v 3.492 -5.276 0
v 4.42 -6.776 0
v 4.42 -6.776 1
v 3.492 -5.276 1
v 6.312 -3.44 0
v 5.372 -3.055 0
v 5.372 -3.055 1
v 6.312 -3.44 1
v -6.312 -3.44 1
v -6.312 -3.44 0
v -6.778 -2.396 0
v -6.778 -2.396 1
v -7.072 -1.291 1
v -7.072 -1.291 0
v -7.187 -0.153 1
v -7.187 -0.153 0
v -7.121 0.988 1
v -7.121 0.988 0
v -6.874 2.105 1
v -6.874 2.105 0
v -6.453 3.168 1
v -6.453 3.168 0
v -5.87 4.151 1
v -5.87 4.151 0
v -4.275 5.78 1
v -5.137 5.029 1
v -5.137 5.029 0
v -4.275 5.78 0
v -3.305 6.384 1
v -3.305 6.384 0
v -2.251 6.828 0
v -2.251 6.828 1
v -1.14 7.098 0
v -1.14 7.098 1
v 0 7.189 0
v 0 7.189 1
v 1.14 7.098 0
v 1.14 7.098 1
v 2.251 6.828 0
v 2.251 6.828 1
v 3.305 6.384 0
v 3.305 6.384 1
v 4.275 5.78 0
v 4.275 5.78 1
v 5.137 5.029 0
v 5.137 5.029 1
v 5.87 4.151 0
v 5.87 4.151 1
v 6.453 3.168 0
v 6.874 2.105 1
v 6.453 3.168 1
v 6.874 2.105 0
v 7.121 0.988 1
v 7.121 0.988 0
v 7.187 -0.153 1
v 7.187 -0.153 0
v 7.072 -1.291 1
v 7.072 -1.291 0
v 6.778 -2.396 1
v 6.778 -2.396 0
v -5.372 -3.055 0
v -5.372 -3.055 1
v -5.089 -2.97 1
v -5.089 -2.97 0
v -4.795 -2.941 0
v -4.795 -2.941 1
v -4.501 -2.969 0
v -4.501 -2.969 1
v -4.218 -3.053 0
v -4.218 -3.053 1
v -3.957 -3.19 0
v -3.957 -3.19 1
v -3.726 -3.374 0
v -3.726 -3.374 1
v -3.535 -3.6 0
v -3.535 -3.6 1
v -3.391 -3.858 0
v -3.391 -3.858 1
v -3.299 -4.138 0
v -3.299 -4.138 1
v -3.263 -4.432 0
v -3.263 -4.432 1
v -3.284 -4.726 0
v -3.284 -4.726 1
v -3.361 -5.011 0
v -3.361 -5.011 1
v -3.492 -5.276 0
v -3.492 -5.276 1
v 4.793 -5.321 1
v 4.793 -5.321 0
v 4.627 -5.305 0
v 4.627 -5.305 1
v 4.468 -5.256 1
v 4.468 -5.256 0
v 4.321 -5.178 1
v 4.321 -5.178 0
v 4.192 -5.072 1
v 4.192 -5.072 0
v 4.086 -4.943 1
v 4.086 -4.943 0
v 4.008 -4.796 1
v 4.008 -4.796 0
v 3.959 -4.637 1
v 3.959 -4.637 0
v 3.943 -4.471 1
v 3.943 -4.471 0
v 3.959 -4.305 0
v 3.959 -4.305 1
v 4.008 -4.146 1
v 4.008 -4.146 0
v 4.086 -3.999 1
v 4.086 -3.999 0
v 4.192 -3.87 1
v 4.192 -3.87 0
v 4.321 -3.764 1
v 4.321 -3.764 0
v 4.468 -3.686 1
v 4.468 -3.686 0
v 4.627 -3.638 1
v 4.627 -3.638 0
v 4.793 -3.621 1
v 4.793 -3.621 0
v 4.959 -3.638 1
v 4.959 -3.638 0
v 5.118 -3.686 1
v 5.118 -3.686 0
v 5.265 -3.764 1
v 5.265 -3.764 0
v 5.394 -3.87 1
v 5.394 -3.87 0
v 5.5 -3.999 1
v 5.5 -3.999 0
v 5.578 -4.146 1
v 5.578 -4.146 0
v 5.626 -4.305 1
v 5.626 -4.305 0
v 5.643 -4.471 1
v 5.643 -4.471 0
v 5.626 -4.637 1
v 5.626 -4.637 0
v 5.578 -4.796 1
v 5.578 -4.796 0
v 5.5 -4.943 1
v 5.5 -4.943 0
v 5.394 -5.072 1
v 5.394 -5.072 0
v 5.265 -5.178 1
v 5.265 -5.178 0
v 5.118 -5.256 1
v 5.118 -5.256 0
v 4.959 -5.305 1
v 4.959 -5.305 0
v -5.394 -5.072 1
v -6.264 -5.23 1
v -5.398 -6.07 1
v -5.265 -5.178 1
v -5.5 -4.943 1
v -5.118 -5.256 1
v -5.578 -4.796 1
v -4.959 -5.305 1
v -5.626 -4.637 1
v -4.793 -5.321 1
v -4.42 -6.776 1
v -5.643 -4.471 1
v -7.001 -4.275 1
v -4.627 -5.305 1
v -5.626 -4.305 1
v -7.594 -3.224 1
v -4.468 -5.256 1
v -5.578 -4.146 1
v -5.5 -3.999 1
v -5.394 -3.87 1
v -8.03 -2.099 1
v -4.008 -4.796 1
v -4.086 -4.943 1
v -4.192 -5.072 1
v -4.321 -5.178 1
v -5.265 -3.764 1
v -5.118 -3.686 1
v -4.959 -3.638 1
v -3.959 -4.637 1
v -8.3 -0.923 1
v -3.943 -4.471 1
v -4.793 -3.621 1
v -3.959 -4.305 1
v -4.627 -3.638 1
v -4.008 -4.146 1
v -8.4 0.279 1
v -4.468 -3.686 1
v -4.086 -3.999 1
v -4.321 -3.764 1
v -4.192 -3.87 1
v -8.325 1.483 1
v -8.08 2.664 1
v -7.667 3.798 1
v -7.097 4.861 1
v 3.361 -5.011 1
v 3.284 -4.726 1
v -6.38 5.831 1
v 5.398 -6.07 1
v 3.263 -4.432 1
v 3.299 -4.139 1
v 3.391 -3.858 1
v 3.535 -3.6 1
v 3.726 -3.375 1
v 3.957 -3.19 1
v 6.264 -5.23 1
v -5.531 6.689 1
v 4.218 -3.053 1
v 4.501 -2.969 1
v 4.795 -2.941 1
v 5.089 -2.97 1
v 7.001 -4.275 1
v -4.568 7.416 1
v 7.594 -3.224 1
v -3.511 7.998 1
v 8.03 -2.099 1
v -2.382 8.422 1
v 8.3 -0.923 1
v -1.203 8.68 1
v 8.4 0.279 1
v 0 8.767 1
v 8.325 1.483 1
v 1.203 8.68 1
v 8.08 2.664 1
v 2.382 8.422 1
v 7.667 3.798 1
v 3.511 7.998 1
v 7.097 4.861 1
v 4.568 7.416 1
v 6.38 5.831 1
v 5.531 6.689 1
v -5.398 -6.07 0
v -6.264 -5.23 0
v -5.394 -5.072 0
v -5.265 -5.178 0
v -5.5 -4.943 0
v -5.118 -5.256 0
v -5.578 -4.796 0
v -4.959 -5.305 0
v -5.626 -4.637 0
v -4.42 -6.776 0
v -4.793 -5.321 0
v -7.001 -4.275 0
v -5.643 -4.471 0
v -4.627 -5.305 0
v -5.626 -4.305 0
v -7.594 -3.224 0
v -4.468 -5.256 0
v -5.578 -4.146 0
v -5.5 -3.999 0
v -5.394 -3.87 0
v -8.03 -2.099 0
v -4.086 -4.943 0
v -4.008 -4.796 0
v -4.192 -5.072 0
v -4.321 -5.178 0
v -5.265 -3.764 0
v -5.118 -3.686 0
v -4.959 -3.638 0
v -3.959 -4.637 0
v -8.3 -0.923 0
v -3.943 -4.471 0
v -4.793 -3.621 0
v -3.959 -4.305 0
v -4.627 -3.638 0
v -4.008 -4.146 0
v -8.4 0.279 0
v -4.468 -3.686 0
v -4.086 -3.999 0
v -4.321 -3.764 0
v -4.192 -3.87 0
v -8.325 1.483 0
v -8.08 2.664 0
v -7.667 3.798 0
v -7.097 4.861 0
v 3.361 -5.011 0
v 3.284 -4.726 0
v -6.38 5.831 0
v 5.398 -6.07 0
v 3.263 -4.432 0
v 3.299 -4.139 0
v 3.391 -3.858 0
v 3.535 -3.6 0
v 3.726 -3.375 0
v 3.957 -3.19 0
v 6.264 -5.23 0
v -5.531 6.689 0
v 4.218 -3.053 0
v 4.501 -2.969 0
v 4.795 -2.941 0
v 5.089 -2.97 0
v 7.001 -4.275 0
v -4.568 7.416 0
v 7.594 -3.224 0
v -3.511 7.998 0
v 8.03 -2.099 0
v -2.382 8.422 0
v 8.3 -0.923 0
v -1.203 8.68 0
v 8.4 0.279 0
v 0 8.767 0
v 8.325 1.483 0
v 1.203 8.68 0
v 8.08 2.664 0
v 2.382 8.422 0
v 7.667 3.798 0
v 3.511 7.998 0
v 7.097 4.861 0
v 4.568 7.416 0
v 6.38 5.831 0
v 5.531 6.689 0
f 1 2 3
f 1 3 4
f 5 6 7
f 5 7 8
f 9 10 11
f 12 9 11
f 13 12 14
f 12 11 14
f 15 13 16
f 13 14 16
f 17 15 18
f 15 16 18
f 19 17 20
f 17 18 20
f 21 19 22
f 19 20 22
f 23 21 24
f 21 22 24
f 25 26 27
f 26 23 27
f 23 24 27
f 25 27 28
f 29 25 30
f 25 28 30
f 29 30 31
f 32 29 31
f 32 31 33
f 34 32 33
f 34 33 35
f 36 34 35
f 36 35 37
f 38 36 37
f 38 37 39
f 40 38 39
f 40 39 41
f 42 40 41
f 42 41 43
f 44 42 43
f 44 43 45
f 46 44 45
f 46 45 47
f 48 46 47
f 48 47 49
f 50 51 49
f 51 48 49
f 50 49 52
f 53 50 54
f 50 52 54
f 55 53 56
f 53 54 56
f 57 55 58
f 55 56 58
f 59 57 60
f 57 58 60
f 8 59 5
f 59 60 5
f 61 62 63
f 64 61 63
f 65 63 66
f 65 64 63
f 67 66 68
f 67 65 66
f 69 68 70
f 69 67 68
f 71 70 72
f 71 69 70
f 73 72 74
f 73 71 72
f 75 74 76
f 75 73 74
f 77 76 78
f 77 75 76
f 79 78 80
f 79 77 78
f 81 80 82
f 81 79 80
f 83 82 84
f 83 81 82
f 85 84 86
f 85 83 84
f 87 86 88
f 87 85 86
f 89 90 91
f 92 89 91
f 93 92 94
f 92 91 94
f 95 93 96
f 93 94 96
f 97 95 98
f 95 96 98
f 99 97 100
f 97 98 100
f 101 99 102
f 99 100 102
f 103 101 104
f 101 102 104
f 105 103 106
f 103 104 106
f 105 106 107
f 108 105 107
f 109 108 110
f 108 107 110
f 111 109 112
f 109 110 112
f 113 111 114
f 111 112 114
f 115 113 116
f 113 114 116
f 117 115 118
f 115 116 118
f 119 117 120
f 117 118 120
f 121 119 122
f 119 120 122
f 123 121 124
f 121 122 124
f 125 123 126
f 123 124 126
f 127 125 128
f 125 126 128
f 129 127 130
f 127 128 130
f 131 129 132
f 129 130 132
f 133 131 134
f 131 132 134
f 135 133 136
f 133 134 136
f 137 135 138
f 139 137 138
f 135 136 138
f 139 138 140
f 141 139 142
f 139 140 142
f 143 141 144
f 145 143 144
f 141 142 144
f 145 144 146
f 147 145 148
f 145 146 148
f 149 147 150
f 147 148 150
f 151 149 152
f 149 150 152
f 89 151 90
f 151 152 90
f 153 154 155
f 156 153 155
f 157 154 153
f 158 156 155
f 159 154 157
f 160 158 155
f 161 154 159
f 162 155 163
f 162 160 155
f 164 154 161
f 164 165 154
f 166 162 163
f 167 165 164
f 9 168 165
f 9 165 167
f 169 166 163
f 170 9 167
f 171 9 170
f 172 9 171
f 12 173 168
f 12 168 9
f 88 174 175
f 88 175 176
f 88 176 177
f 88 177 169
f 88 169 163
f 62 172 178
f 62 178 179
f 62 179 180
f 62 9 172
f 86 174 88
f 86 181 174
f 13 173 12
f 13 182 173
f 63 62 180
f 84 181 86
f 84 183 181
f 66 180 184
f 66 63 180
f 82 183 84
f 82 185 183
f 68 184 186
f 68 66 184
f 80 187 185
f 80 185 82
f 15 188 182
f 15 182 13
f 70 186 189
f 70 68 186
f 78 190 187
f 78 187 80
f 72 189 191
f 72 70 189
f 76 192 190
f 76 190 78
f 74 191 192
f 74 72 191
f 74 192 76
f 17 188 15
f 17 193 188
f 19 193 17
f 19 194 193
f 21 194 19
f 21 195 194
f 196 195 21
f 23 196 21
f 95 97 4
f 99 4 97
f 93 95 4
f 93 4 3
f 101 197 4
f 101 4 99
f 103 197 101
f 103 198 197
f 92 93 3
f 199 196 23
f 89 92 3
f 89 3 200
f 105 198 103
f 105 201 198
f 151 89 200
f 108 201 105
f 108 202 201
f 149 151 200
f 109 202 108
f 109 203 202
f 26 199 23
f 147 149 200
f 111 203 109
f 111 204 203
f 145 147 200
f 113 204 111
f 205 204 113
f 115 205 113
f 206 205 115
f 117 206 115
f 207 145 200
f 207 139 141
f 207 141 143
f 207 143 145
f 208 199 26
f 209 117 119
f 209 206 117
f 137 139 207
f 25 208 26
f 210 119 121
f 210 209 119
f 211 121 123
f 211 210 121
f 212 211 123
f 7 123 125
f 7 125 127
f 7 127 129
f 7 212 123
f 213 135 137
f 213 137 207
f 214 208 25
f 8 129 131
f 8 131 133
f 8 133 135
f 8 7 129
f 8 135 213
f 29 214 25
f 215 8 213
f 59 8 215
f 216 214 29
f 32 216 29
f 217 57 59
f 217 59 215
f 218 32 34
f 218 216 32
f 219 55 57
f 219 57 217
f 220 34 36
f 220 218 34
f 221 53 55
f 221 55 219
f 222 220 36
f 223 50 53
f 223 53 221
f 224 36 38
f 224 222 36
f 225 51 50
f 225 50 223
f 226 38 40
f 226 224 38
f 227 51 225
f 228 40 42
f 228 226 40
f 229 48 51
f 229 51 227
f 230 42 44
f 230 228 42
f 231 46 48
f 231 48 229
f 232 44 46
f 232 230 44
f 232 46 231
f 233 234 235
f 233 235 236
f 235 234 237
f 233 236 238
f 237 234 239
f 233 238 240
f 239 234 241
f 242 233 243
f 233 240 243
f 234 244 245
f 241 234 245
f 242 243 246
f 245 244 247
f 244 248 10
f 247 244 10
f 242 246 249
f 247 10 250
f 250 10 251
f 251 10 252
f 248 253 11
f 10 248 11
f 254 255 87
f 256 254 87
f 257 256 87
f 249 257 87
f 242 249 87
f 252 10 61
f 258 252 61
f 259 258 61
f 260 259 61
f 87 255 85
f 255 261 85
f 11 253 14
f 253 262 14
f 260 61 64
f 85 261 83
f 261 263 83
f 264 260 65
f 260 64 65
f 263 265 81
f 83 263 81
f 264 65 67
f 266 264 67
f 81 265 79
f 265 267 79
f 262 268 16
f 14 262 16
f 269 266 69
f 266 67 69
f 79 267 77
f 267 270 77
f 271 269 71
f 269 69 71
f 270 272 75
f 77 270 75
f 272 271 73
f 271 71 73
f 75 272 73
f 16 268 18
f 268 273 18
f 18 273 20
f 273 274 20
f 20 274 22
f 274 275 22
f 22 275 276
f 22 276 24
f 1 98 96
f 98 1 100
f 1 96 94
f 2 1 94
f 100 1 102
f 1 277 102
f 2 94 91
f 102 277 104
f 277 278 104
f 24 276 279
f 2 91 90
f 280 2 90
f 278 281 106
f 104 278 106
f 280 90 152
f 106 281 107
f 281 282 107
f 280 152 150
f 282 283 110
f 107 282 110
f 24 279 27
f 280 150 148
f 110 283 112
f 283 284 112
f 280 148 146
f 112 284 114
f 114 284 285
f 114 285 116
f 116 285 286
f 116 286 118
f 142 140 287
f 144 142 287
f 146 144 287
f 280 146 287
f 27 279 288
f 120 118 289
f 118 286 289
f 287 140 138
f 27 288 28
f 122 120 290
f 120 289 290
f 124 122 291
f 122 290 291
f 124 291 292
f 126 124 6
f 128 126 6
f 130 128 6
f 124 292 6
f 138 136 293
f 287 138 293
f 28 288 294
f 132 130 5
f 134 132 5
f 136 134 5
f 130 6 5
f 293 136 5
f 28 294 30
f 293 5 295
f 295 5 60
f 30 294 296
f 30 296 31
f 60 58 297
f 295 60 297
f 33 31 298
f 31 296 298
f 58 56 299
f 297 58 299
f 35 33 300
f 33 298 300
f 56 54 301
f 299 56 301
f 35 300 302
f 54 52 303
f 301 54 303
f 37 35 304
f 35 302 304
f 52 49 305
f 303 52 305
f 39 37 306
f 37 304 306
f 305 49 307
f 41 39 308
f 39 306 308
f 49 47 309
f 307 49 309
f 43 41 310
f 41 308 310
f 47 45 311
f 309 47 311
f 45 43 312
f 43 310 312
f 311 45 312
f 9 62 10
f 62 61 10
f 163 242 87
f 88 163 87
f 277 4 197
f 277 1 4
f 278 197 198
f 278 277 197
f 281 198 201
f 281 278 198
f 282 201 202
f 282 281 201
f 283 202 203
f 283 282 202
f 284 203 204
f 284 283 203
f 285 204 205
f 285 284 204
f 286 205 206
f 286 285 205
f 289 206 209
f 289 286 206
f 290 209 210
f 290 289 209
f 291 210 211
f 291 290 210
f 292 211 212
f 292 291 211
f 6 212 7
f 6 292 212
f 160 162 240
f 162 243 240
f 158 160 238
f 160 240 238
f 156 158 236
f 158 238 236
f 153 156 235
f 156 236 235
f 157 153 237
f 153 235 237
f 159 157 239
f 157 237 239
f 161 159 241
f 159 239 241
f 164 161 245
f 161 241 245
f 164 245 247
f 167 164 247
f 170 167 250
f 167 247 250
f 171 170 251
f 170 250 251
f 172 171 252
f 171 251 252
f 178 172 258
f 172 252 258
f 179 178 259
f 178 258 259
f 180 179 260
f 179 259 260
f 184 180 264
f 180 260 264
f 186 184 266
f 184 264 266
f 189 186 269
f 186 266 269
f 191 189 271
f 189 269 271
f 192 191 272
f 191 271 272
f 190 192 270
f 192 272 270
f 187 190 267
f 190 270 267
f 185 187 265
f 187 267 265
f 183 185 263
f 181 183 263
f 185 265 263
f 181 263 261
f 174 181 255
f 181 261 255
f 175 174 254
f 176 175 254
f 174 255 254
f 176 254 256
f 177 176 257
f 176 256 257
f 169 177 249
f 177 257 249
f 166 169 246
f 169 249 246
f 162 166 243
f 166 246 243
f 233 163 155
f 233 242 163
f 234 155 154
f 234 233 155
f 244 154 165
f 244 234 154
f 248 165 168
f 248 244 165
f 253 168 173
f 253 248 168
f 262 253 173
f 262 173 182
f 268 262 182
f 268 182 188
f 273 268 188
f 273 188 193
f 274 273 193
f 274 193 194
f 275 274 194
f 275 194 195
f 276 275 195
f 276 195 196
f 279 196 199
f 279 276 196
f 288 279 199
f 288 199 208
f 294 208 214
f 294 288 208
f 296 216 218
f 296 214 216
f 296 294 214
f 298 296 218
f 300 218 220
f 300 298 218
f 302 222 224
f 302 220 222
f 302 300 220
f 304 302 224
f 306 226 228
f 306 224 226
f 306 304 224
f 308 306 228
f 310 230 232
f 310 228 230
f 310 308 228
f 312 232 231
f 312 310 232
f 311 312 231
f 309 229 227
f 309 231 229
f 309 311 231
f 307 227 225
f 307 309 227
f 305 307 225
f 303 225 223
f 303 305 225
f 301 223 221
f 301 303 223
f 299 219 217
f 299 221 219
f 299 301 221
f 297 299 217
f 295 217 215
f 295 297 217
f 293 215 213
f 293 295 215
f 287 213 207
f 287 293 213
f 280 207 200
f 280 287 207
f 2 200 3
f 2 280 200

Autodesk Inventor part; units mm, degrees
ref_plane "WorkPlane1" through (0, 0, 0) normal (0, 0, 1) x (1, 0, 0)
ref_plane "Work Plane2" through (0, 0, -1) normal (0, 0, 1) x (1, 0, 0)
ref_plane "WorkPlane2" through (0, 0, 1) normal (0, 0, 1) x (1, 0, 0)
sketch "Sketch1" plane through (0, 0, 0) normal (0, 0, 1) x (1, 0, 0)
  point P0 (0, 0)
sketch "Sketch2" plane through (0, 0, 0) normal (0, 0, 1) x (1, 0, 0)
  line L0 (4.42, -6.7764) -> (3.4917, -5.2763)
  arc A0 (5.3722, -3.0552) -> (3.4917, -5.2763) centre (4.7928, -4.4712) ccw
  line L1 (5.3722, -3.0552) -> (6.3125, -3.4399)
  arc A1 (6.3125, -3.4399) -> (-6.3125, -3.4399) centre (0, 0) ccw
  line L2 (-5.3722, -3.0552) -> (-6.3125, -3.4399)
  arc A2 (-3.4917, -5.2763) -> (-5.3722, -3.0552) centre (-4.7928, -4.4712) ccw
  line L3 (-4.42, -6.7764) -> (-3.4917, -5.2763)
  arc A3 (4.42, -6.7764) -> (-4.42, -6.7764) centre (0, 0.3667) ccw
  line L4 (0, 0.3667) -> (-4.42, -6.7764) construction
  line L5 (0, 0.3667) -> (4.42, -6.7764) construction
  dimension "d2" = 8.4
  dimension "d4" = 0
  dimension "d6" = 7.1889
  dimension "d8" = 0.3667
  dimension "d10" = 4.42
  dimension "d12" = 4.42
  dimension "d14" = 1.53
  dimension "d16" = 1.53
  dimension "d18" = 6.81
  dimension "d20" = 6.81
  dimension "d22" = 36
  dimension "d24" = 36
extrude "Extrusion1" add sketch "Sketch2" along normal blind 1
sketch "Sketch3" plane through (0, 0, 1) normal (0, 0, 1) x (1, 0, 0)
  arc A0 (-3.4917, -5.2763) -> (-5.3722, -3.0552) centre (-4.7928, -4.4712) ccw projected
hole "Hole1" at (-4.7928, -4.4712, 1) direction (0, 0, -1) diameter 1.7 end through all
sketch "Sketch4" plane through (0, 0, 1) normal (0, 0, 1) x (1, 0, 0)
  arc A0 (5.3722, -3.0552) -> (3.4917, -5.2763) centre (4.7928, -4.4712) ccw projected
hole "Hole2" at (4.7928, -4.4712, 1) direction (0, 0, -1) diameter 1.7 end through all
equation "\"d29\" = Diam5"
equation "\"d36\" = Diam5"
equation "\"d2\" = 0.5 * Diam2"
equation "\"d6\" = 0.5 * msp_dd1"
equation "\"d8\" = -0.5 * msp_dd1 + 0.5 * Diam2 - 0.222222 * ParA"
equation "\"d10\" = 2.6 * Diam5"
equation "\"d12\" = 2.6 * Diam5"
equation "\"d14\" = 0.9 * Diam5"
equation "\"d16\" = 0.9 * Diam5"
equation "\"d18\" = 1.3 * Diam5 + 0.5 * Diam2 - ParA"
equation "\"d20\" = 1.3 * Diam5 + 0.5 * Diam2 - ParA"
equation "\"d25\" = ParS"
equation "\"Diam5\" = 1.7"
equation "\"ParA\" = 3.8"
equation "\"ParS\" = 1"
equation "\"Diam2\" = 16.8"
equation "\"msp_dd1\" = -b + Diam2 - 0.111111 * ParA"
equation "\"msp_pom\" = 0.5 * Diam2 - b"
equation "\"TEMPLATE\" = 1.2345"
properties part number "DIN 472 - 16x1" material "Steel, Mild"
